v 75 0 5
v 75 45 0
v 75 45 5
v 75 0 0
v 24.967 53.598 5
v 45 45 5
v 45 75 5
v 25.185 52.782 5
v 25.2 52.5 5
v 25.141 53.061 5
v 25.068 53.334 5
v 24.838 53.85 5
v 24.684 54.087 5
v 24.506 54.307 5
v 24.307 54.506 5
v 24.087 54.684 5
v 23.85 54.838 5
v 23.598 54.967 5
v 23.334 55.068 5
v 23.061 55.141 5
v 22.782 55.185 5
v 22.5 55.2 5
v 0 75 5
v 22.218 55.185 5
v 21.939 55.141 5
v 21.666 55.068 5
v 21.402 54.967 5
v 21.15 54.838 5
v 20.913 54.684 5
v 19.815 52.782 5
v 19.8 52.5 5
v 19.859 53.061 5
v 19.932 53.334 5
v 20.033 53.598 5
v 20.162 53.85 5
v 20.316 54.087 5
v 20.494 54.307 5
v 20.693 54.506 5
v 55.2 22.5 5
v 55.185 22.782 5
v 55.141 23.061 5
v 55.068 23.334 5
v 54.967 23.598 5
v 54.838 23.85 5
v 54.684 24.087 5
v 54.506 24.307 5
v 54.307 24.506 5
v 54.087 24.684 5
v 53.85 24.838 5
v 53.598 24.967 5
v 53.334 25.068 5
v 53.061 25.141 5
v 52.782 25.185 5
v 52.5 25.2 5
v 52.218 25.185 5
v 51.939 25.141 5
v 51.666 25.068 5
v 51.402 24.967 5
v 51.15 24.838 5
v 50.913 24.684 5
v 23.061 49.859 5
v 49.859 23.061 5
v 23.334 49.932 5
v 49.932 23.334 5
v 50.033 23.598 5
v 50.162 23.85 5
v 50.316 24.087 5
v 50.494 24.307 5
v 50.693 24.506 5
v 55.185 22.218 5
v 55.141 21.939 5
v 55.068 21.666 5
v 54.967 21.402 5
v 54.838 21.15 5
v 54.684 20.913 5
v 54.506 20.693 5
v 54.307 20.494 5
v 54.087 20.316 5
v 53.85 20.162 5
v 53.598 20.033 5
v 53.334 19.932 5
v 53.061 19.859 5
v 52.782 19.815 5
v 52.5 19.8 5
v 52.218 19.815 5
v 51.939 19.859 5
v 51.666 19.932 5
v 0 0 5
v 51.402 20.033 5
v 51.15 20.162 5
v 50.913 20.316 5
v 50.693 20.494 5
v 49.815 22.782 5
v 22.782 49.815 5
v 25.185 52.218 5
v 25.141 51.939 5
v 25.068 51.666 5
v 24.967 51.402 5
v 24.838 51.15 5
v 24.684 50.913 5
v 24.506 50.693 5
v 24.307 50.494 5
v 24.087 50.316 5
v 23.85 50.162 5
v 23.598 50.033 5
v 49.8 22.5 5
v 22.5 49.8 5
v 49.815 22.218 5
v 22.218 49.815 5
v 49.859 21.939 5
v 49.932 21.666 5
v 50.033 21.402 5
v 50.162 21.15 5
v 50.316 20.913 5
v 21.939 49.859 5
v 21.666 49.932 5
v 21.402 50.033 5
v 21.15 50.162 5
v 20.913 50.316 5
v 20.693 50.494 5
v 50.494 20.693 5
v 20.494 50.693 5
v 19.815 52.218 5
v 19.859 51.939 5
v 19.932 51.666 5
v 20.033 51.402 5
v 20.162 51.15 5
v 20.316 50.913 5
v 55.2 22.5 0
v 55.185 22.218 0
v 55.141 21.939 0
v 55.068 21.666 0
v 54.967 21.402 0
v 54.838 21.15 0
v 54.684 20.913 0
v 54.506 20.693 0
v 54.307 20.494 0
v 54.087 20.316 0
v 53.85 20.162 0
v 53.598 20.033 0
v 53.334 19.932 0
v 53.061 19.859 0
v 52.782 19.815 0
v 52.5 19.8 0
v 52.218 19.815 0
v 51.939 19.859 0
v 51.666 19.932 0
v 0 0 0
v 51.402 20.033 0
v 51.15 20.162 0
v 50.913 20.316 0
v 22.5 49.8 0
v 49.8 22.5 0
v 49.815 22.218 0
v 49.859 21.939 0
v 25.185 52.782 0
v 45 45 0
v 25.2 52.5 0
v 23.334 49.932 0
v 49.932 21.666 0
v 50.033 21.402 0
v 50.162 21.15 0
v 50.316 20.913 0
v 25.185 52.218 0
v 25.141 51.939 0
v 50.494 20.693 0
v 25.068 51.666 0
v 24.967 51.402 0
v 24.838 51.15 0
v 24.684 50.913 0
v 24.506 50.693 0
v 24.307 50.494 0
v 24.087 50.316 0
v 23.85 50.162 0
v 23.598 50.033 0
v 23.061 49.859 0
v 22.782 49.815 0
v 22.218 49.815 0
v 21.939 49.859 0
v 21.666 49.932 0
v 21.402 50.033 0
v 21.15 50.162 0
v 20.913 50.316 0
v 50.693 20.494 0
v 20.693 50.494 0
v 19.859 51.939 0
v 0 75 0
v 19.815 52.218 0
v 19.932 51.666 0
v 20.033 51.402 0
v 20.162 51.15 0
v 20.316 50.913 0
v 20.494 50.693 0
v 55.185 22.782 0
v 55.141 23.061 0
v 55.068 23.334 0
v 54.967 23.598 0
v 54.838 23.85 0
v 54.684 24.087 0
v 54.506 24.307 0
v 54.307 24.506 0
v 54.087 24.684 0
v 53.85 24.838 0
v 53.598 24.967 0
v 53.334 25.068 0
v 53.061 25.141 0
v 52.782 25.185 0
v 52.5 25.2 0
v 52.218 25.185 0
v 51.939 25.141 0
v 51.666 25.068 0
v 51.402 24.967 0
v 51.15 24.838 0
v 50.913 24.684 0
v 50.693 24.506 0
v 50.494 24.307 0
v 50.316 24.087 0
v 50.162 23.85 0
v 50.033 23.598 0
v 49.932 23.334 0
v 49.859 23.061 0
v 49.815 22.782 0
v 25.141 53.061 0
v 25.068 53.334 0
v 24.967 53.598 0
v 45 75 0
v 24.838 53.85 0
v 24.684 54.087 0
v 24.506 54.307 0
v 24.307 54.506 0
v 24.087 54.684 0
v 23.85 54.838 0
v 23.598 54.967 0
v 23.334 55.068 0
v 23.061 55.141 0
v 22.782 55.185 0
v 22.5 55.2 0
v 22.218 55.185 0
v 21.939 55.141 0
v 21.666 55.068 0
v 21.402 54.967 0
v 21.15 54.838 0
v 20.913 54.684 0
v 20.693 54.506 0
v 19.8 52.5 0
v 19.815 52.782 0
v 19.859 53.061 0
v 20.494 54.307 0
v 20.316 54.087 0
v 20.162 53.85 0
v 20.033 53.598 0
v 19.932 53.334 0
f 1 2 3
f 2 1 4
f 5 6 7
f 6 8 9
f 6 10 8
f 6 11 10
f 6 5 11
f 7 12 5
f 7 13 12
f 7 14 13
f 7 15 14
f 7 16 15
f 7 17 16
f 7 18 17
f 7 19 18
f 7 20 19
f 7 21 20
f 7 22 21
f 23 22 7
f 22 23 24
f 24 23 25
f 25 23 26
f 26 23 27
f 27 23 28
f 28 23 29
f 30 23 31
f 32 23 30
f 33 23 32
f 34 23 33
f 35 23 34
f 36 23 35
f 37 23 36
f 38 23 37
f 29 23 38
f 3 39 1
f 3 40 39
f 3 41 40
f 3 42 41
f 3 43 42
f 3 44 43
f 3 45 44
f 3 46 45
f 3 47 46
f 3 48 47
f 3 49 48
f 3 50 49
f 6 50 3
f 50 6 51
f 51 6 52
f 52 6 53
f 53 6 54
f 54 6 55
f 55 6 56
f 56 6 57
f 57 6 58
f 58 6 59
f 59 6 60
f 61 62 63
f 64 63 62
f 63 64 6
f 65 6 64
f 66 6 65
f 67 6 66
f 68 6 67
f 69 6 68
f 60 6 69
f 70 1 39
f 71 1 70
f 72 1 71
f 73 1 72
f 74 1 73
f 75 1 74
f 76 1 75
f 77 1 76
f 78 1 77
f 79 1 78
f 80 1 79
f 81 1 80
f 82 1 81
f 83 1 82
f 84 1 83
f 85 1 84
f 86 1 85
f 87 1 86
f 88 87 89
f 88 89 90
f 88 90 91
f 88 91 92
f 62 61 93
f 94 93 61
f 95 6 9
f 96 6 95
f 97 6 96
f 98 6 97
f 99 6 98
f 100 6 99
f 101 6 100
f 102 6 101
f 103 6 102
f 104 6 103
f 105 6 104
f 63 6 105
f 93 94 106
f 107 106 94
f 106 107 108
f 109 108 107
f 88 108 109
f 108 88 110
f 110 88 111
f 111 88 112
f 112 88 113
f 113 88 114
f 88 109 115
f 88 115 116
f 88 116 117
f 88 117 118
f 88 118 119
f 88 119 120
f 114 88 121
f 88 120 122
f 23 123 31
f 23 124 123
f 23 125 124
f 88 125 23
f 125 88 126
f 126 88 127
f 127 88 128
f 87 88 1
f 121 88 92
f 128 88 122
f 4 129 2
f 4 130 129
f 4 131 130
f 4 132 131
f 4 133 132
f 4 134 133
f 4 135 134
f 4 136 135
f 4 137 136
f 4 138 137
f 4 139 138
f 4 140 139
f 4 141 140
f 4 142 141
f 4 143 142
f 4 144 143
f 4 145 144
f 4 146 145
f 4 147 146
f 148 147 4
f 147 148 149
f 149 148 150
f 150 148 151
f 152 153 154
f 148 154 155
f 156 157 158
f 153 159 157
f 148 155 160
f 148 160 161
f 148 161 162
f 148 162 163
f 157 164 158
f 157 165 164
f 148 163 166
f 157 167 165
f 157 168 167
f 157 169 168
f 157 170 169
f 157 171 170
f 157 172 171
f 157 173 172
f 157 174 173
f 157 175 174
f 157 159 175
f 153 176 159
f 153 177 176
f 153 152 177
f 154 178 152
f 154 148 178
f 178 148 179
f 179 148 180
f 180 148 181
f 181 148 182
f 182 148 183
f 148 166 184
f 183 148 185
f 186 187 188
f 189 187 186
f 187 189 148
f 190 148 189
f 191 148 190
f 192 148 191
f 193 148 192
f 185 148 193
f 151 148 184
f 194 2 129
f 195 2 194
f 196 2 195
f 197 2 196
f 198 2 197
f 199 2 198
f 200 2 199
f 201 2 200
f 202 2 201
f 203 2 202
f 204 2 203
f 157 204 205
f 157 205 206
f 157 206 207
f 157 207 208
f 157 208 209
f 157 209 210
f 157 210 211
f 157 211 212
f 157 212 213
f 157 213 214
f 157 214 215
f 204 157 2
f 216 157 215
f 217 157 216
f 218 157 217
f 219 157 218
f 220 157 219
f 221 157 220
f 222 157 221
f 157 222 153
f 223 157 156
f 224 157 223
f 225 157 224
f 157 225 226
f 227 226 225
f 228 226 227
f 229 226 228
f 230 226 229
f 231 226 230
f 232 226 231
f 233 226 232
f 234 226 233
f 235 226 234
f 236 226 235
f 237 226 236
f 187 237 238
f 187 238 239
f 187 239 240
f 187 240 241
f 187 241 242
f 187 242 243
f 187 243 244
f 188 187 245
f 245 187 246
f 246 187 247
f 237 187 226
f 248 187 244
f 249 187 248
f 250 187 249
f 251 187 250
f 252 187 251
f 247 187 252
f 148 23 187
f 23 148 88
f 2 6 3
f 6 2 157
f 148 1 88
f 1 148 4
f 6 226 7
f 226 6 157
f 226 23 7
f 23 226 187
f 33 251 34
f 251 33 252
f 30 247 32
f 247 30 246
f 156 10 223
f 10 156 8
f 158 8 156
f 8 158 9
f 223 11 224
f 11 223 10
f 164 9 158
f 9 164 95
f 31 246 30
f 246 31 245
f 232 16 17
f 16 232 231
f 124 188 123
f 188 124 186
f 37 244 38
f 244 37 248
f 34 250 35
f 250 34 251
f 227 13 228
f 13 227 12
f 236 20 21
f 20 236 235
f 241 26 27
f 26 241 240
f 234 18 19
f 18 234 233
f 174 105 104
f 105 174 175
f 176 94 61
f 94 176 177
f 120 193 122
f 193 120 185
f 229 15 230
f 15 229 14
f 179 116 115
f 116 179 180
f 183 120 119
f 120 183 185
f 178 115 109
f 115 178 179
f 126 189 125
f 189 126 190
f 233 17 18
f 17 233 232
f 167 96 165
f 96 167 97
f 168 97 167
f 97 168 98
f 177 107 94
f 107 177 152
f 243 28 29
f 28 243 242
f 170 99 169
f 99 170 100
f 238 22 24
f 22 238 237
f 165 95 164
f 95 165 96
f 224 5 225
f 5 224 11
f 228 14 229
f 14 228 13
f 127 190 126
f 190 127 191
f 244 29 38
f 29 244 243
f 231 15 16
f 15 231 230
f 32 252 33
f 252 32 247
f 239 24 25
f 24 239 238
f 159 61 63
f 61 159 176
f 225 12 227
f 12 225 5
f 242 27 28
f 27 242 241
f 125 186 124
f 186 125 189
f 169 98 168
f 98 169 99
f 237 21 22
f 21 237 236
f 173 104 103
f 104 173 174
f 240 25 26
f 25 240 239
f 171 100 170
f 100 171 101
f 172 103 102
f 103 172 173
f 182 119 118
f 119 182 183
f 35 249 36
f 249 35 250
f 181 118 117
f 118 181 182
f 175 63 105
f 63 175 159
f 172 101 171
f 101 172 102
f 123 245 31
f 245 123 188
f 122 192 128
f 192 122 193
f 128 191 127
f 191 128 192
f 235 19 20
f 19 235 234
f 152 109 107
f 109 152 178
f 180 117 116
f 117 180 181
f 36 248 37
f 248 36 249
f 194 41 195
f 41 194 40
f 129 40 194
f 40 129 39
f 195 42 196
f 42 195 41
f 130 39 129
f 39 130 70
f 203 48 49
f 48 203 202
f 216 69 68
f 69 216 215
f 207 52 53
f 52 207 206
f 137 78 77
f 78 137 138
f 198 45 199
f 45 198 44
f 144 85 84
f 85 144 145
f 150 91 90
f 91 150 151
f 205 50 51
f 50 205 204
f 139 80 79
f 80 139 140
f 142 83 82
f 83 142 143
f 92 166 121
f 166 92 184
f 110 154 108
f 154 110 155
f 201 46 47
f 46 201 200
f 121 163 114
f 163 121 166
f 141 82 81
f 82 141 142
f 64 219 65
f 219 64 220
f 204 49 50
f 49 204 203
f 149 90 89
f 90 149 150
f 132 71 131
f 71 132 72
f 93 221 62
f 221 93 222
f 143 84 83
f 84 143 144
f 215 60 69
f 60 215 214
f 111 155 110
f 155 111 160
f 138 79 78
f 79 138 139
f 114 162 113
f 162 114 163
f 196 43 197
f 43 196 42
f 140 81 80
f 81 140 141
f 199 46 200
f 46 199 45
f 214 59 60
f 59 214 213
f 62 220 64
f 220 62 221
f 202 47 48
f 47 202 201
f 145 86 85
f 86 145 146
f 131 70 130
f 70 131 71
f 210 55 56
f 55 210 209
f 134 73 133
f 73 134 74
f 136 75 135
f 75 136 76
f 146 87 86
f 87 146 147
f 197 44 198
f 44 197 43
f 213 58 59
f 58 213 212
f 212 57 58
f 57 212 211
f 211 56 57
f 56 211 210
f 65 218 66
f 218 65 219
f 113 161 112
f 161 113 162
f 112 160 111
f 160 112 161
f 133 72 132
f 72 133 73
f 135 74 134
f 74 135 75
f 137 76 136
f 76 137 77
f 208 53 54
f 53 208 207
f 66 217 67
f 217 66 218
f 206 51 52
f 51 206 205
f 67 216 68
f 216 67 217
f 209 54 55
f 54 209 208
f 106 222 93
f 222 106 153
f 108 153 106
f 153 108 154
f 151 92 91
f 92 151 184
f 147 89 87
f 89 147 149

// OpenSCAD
// V-slot corner connector.
$fn = 60;
eps = 0.02;
profile = 45;
arm = 75;
plate_t = 5;
difference() {
    union() { cube([arm,profile,plate_t]); cube([profile,arm,plate_t]); }
    for (p=[[profile/2,arm-profile/2],[arm-profile/2,profile/2]]) translate([p[0],p[1],-eps]) cylinder(d=5.4,h=plate_t+2*eps);
}
